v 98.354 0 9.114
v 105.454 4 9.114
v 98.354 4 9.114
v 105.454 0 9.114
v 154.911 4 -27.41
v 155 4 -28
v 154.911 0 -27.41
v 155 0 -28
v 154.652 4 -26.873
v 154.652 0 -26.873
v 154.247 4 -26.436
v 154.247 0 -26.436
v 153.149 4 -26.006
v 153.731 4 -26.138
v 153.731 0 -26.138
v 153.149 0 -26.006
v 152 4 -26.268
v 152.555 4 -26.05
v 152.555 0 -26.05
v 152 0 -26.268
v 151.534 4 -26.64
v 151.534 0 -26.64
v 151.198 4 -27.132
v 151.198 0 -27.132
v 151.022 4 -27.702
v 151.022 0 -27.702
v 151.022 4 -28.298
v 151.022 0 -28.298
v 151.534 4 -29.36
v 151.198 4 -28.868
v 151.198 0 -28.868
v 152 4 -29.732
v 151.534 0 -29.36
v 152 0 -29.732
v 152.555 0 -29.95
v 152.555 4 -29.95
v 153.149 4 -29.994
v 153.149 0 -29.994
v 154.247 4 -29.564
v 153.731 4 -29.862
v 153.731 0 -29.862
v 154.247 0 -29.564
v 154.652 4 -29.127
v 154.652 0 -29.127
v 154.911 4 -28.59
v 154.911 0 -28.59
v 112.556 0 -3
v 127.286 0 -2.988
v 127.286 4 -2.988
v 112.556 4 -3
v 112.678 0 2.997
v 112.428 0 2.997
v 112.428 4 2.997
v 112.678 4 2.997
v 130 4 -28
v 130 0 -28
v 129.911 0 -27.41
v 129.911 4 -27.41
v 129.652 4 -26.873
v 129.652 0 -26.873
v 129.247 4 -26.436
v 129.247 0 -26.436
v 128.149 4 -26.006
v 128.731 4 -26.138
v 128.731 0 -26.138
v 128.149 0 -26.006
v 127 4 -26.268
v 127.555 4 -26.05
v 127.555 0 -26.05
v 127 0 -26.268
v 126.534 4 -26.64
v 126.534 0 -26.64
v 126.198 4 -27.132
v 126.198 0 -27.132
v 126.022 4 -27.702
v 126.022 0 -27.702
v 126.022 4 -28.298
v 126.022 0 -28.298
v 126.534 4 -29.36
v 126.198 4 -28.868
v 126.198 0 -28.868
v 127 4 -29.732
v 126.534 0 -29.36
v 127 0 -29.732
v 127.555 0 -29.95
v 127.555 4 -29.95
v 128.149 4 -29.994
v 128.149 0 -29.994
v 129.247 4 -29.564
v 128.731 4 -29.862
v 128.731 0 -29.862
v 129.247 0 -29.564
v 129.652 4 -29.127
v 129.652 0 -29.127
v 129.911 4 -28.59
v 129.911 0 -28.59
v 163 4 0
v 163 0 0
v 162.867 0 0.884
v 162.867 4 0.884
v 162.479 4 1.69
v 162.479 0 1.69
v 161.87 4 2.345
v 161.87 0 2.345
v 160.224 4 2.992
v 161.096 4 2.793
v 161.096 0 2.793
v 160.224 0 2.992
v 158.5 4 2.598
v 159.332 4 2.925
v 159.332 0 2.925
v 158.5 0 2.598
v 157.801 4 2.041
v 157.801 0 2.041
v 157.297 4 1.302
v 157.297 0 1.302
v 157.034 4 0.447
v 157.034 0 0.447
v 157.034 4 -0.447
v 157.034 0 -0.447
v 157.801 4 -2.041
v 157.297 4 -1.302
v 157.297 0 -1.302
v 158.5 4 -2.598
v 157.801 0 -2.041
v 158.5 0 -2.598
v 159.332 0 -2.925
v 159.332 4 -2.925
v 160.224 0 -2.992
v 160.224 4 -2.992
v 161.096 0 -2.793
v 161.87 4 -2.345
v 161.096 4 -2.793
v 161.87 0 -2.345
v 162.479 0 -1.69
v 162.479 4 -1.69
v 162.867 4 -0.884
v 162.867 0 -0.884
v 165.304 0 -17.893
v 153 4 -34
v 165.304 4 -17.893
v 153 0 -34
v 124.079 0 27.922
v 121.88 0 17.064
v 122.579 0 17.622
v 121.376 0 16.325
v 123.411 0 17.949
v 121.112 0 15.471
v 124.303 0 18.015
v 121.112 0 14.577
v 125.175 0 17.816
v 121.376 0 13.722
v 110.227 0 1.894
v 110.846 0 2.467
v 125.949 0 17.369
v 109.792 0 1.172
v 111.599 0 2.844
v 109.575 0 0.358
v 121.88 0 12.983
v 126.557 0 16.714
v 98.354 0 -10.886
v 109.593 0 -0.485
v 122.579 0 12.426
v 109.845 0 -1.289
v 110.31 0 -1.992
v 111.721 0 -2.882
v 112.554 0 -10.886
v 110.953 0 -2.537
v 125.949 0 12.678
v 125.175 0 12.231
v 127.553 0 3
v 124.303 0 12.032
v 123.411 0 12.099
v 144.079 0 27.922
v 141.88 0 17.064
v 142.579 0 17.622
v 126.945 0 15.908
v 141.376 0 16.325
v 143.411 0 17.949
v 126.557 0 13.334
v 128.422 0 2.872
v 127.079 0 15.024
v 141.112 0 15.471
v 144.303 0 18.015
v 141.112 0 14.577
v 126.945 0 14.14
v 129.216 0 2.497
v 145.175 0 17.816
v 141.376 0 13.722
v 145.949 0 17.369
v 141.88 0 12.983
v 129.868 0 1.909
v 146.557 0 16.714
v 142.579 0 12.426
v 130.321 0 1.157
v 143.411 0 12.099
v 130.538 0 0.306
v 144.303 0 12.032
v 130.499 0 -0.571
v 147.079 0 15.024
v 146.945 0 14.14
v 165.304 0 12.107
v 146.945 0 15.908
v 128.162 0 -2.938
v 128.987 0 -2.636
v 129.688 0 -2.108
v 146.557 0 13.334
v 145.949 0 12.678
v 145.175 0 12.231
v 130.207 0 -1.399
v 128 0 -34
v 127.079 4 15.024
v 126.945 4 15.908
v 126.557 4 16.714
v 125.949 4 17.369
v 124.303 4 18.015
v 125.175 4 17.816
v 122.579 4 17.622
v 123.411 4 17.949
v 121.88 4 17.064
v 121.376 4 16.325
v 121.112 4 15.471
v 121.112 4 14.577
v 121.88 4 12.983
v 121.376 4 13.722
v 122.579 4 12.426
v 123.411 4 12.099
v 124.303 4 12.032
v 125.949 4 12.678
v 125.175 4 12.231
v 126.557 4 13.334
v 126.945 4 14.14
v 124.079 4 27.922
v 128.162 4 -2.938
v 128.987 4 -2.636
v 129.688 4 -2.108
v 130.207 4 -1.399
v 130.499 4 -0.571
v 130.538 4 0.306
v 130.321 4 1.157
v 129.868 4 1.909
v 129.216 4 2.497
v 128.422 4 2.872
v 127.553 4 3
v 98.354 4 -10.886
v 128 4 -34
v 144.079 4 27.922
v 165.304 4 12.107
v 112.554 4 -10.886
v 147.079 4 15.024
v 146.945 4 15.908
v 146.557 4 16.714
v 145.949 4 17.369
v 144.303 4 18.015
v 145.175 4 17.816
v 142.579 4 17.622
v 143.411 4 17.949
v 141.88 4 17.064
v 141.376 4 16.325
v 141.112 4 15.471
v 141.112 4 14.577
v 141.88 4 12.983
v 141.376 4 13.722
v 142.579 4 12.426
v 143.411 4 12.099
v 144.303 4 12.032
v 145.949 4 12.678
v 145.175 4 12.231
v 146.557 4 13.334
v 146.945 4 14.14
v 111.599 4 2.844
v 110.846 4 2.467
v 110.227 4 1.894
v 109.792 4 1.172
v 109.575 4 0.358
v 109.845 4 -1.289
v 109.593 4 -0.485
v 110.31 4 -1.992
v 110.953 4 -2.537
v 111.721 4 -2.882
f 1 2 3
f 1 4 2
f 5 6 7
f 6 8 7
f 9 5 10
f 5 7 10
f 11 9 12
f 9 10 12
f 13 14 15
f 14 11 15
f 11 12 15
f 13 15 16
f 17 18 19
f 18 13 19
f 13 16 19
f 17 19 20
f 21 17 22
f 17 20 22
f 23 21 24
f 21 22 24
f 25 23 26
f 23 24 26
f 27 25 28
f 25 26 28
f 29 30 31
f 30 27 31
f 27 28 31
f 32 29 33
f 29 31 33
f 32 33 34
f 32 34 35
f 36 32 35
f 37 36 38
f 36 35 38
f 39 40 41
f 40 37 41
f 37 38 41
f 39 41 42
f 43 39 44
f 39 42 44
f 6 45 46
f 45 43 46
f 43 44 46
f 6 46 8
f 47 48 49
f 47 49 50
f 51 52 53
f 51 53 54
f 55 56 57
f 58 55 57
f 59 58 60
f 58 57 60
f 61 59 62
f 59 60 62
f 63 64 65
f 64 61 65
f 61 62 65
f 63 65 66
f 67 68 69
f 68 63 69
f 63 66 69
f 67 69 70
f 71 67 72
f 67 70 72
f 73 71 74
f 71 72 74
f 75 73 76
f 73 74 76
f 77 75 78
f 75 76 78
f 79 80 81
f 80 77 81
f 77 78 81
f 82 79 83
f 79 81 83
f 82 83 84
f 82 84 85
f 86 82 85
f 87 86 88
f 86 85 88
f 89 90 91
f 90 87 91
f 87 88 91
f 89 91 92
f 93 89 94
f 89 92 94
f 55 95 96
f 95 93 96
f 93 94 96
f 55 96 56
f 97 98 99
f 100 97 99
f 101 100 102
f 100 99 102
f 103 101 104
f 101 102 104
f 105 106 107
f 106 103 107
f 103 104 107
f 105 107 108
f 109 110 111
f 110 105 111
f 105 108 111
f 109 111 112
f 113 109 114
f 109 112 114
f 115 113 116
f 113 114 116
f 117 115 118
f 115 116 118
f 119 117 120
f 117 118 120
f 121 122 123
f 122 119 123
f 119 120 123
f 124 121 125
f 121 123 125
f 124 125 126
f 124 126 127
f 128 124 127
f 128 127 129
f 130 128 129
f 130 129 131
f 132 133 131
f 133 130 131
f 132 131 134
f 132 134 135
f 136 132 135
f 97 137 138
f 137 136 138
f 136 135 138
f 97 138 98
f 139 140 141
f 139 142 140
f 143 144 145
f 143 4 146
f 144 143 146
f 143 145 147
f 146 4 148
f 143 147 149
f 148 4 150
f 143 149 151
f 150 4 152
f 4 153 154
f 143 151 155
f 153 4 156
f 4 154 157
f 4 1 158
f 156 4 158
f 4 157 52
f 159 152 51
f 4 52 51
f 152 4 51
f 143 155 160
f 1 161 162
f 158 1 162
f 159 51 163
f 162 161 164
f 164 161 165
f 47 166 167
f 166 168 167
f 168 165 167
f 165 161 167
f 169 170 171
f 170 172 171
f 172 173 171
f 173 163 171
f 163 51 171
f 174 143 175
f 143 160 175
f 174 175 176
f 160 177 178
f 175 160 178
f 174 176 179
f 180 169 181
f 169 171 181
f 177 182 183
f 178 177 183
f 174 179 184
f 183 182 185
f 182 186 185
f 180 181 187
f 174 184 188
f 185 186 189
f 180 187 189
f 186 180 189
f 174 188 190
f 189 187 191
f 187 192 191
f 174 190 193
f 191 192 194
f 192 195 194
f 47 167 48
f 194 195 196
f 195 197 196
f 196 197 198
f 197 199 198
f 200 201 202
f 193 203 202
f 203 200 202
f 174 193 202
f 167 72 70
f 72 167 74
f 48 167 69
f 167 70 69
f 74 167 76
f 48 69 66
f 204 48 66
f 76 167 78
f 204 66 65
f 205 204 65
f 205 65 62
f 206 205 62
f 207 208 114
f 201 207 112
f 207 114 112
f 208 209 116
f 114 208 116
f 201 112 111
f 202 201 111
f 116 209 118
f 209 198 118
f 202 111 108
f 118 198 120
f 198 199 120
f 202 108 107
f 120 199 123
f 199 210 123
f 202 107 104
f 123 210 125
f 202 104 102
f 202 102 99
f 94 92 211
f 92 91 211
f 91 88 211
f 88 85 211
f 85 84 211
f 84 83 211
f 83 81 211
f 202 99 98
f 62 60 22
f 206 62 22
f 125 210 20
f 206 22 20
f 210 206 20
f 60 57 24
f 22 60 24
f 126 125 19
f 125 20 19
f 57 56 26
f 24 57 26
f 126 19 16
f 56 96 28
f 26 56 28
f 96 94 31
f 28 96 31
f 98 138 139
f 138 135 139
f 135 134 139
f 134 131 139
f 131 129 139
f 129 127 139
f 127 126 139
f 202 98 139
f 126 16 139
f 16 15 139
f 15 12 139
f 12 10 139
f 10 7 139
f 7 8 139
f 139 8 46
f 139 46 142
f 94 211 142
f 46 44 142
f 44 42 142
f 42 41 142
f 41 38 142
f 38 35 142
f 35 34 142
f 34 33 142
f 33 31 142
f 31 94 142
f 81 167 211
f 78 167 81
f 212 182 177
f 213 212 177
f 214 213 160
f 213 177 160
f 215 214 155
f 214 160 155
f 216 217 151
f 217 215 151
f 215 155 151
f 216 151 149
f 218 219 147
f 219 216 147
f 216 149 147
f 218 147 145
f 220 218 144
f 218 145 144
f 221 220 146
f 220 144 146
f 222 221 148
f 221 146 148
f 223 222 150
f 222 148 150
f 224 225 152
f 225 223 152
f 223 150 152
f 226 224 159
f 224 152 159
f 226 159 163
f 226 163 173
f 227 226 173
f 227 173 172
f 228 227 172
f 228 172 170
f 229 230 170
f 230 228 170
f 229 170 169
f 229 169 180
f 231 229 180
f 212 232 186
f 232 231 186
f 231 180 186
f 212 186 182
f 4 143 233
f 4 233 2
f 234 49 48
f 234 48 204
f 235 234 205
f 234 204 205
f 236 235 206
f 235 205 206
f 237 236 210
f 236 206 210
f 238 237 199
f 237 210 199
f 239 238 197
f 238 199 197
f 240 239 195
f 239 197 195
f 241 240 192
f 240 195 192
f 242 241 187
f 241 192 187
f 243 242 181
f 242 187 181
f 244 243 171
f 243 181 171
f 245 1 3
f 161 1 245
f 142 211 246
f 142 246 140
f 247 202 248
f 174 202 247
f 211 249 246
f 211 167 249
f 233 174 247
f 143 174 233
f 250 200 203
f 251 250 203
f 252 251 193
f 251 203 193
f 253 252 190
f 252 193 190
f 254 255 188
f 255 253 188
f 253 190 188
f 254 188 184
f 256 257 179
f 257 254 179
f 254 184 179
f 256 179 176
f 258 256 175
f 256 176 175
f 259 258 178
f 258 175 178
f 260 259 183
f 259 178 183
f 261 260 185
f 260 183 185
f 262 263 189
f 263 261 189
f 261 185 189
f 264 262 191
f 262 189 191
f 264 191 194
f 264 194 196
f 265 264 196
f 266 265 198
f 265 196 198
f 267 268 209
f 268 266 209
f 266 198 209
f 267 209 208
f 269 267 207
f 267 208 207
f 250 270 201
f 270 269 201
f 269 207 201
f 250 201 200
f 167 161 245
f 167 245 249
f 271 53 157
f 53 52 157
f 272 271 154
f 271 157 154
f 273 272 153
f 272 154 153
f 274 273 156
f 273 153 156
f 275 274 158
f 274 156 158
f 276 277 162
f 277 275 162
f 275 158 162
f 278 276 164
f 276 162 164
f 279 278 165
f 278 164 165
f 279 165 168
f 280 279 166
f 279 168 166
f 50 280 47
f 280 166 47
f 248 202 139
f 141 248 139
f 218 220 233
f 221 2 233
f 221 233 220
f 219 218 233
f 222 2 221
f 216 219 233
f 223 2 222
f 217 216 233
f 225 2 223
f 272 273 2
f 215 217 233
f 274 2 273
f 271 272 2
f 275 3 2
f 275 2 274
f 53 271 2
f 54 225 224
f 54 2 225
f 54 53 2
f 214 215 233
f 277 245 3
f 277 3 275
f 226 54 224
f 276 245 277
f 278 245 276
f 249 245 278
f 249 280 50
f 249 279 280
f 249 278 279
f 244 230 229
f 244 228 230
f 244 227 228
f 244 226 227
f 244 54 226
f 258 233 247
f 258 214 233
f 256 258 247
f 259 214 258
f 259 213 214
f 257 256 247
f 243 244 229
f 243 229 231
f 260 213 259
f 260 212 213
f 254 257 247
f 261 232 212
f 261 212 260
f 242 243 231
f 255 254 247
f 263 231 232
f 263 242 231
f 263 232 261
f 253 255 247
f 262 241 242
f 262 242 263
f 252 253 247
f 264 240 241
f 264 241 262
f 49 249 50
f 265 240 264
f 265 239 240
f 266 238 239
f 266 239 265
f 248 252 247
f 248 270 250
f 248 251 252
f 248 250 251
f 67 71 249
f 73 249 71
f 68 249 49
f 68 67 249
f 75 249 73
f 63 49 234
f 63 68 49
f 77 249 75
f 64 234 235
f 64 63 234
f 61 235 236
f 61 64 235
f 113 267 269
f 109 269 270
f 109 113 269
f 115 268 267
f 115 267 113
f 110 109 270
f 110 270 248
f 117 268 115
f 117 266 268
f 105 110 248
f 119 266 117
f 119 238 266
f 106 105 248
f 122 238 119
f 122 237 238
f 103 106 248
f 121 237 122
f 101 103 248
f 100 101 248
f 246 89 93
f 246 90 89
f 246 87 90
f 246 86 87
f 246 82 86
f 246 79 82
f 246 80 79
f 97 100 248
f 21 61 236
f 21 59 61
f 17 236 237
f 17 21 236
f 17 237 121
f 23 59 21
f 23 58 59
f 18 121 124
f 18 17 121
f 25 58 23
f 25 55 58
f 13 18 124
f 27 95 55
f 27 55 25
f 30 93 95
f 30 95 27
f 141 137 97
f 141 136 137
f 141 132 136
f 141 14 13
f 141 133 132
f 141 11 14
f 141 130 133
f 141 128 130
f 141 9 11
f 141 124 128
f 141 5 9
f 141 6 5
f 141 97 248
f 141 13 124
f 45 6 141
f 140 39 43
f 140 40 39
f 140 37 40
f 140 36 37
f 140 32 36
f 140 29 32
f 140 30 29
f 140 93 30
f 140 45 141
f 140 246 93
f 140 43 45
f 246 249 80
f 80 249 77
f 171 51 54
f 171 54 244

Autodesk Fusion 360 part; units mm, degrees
sketch "Sketch1" plane through (0, 0, 0) normal (0, 1, 0) x (1, 0, 0)
  circle A0 centre (0.0008, 24.9355) radius 3
  line L0 (2.5556, 32.9383) -> (-2.4444, 32.9383)
  line L1 (2.5556, 20.6375) -> (2.5556, -15.7025)
  line L2 (8, 25) -> (8, -20)
  circle A1 centre (0, -20) radius 3
  line L3 (-2.6799, 20.7149) -> (-2.6799, -15.7789)
  arc A2 (2.5556, 20.6375) -> (-2.6799, 20.7149) centre (0.0008, 24.9355) ccw
  arc A3 (-2.6799, -15.7789) -> (2.5556, -15.7025) centre (0, -20) ccw
  dimension "d1" = 6
  dimension "d2" = 10
  dimension "d4" = 5
  dimension "d5" = 36.34
  dimension "d6" = 45
  dimension "d7" = 6
sketch "Sketch2" plane through (0, 0, 0) normal (0, 1, 0) x (1, 0, 0)
  circle A0 centre (160, 0) radius 3
  line L0 (165.3043, -12.1067) -> (165.3043, 17.8933)
  line L1 (165.3043, -12.1067) -> (144.0787, -27.9224)
  line L2 (144.0787, -27.9224) -> (124.0787, -27.9224)
  line L3 (124.0787, -27.9224) -> (105.4535, -9.1138)
  line L4 (105.4535, -9.1138) -> (98.3535, -9.1138)
  line L5 (98.3535, -9.1138) -> (98.3535, 10.8862)
  line L6 (98.3535, 10.8862) -> (112.5535, 10.8862)
  line L7 (112.5535, 10.8862) -> (128, 34)
  line L8 (128, 34) -> (153, 34)
  line L9 (153, 34) -> (165.3043, 17.8933)
  circle A1 centre (144.0787, -15.0238) radius 3
  circle A2 centre (124.0787, -15.0238) radius 3
  line L10 (112.4283, -2.9974) -> (127.553, -3)
  line L11 (127.2855, 2.988) -> (112.556, 3)
  arc A3 (127.553, -3) -> (127.2855, 2.988) centre (127.5535, 0) ccw
  arc A4 (112.556, 3) -> (112.6778, -2.9974) centre (112.5535, 0) ccw
  circle A5 centre (128, 28) radius 2
  circle A6 centre (153, 28) radius 2
  dimension "d10" = 6
  dimension "d11" = 30
  dimension "d12" = 26.47
  dimension "d13" = 20
  dimension "d14" = 26.47
  dimension "d15" = 7.1
  dimension "d16" = 20
  dimension "d17" = 14.2
  dimension "d18" = 27.8
  dimension "d19" = 25
  dimension "d21" = 6
  dimension "d22" = 6
  dimension "d23" = 6
  dimension "d24" = 15
  dimension "d25" = 6
  dimension "d26" = 4
  dimension "d27" = 4
sketch "Sketch3" plane through (0, 0, 0) normal (0, 1, 0) x (1, 0, 0)
sketch "Sketch4" plane through (0, 0, 0) normal (0, 1, 0) x (1, 0, 0)
extrude "Extrude2" add sketch "Sketch2" along normal blind 4
sketch "Sketch5" plane through (0, 0, 0) normal (0, 1, 0) x (1, 0, 0)
  circle A0 centre (0, -75) radius 3
  circle A1 centre (-0.0243, -126.973) radius 3
  line L0 (-20, -70) -> (-20, -141.97)
  line L1 (-5, -75) -> (-5, -112.8223)
  line L2 (5, -75) -> (5, -112.8395)
  arc A2 (5, -75) -> (-5, -75) centre (0, -75) ccw
  line L3 (-0.05, -141.973) -> (-0.05, -143.513)
  line L4 (-0.05, -143.513) -> (-0.4621, -143.739)
  line L5 (-0.4621, -143.739) -> (-1.4621, -143.739)
  line L6 (-1.4621, -143.739) -> (-1.9628, -143.2357)
  line L7 (-1.9628, -143.2357) -> (-1.9628, -141.8472)
  line L8 (-0.05, -145.0973) -> (-0.05, -123.9731)
  line L9 (-8.7204, -112.6318) -> (-7.8791, -112.0912)
  line L10 (-8.9448, -113.0448) -> (-8.7204, -112.6318)
  line L11 (-8.1122, -114.3403) -> (-8.9448, -113.0448)
  line L12 (-7.1857, -112.2439) -> (-6.4351, -113.412)
  line L13 (-7.8791, -112.0912) -> (-7.1857, -112.2439)
  line L14 (-12.4085, -115.6627) -> (-11.7536, -114.907)
  line L15 (-12.5075, -116.1222) -> (-12.4085, -115.6627)
  line L16 (-11.3436, -117.1306) -> (-12.5075, -116.1222)
  line L17 (-11.0453, -114.8581) -> (-9.996, -115.7674)
  line L18 (-11.7536, -114.907) -> (-11.0453, -114.8581)
  line L19 (-15.0933, -119.6099) -> (-14.6779, -118.7003)
  line L20 (-15.0589, -120.0786) -> (-15.0933, -119.6099)
  line L21 (-13.658, -120.7184) -> (-15.0589, -120.0786)
  line L22 (-14.012, -118.4539) -> (-12.749, -119.0307)
  line L23 (-14.6779, -118.7003) -> (-14.012, -118.4539)
  line L24 (-16.5573, -124.1536) -> (-16.415, -123.1638)
  line L25 (-16.3922, -124.5936) -> (-16.5573, -124.1536)
  line L26 (-14.8679, -124.8128) -> (-16.3922, -124.5936)
  line L27 (-15.8455, -122.7398) -> (-14.4712, -122.9374)
  line L28 (-16.415, -123.1638) -> (-15.8455, -122.7398)
  line L29 (-16.682, -128.9257) -> (-16.8243, -127.9359)
  line L30 (-16.3995, -129.3014) -> (-16.682, -128.9257)
  line L31 (-14.8752, -129.0822) -> (-16.3995, -129.3014)
  line L32 (-16.3973, -127.3686) -> (-15.023, -127.171)
  line L33 (-16.8243, -127.9359) -> (-16.3973, -127.3686)
  line L34 (-15.4571, -133.5396) -> (-15.8725, -132.63)
  line L35 (-15.0802, -133.8205) -> (-15.4571, -133.5396)
  line L36 (-13.6794, -133.1808) -> (-15.0802, -133.8205)
  line L37 (-15.6226, -131.9654) -> (-14.3596, -131.3886)
  line L38 (-15.8725, -132.63) -> (-15.6226, -131.9654)
  line L39 (-12.9819, -137.6215) -> (-13.6367, -136.8658)
  line L40 (-12.5412, -137.7849) -> (-12.9819, -137.6215)
  line L41 (-11.3773, -136.7764) -> (-12.5412, -137.7849)
  line L42 (-13.5843, -136.1577) -> (-12.5349, -135.2485)
  line L43 (-13.6367, -136.8658) -> (-13.5843, -136.1577)
  line L44 (-9.457, -140.8408) -> (-10.2982, -140.3002)
  line L45 (-8.9881, -140.8734) -> (-9.457, -140.8408)
  line L46 (-8.1555, -139.5779) -> (-8.9881, -140.8734)
  line L47 (-10.4473, -139.606) -> (-9.6967, -138.4379)
  line L48 (-10.2982, -140.3002) -> (-10.4473, -139.606)
  line L49 (-5.1679, -142.9365) -> (-6.1274, -142.6548)
  line L50 (-4.7088, -142.8357) -> (-5.1679, -142.9365)
  line L51 (-4.2749, -141.3581) -> (-4.7088, -142.8357)
  line L52 (-6.466, -142.0308) -> (-6.0748, -140.6985)
  line L53 (-6.1274, -142.6548) -> (-6.466, -142.0308)
  arc A3 (-5, -112.8223) -> (-6.4351, -113.412) centre (-0.0243, -126.973) ccw
  arc A4 (-8.1122, -114.3403) -> (-9.996, -115.7674) centre (-0.0243, -126.973) ccw
  arc A5 (-11.3436, -117.1306) -> (-12.749, -119.0307) centre (-0.0243, -126.973) ccw
  arc A6 (-13.658, -120.7184) -> (-14.4712, -122.9374) centre (-0.0243, -126.973) ccw
  arc A7 (-14.8679, -124.8128) -> (-15.023, -127.171) centre (-0.0243, -126.973) ccw
  arc A8 (-14.8752, -129.0822) -> (-14.3596, -131.3886) centre (-0.0243, -126.973) ccw
  arc A9 (-13.6794, -133.1808) -> (-12.5349, -135.2485) centre (-0.0243, -126.973) ccw
  arc A10 (-11.3773, -136.7764) -> (-9.6967, -138.4379) centre (-0.0243, -126.973) ccw
  arc A11 (-8.1555, -139.5779) -> (-6.0748, -140.6985) centre (-0.0243, -126.973) ccw
  arc A12 (-4.2749, -141.3581) -> (-1.9628, -141.8472) centre (-0.0243, -126.973) ccw
  arc A13 (-0.05, -141.973) -> (5, -112.8395) centre (-0.0243, -126.973) ccw
  dimension "d30" = 6
  dimension "d31" = 10
  dimension "d32" = 6
  dimension "d33" = 30
  dimension "d34" = 71.97
  dimension "d35" = 1.54
  dimension "d36" = 0.47
  dimension "d37" = 1
  dimension "d38" = 0.71
  dimension "d40" = 360
sketch "Sketch6" plane through (0, 0, 0) normal (0, 1, 0) x (1, 0, 0)
  circle A0 centre (135, -70) radius 3
  circle A1 centre (135, -95) radius 3
  line L0 (129.0014, -94.8707) -> (129, -70.0003)
  line L1 (141, -95) -> (141, -70)
  arc A2 (141, -70) -> (129, -70.0003) centre (135, -70) ccw
  line L2 (134.9353, -100.9997) -> (150.363, -126.7288)
  line L3 (138.9186, -99.5437) -> (196.6373, -196.6907)
  arc A3 (129.0014, -94.8707) -> (134.9353, -100.9997) centre (135, -95) ccw
  arc A4 (138.9186, -99.5437) -> (141, -95) centre (135, -95) ccw
  line L4 (196.6373, -196.6907) -> (189.4976, -203.5489)
  line L5 (189.4976, -203.5489) -> (182.5189, -204.0946)
  line L6 (150.363, -126.7288) -> (142.6345, -134.4043)
  line L7 (179.3777, -201.8435) -> (142.738, -137.5509)
  arc A5 (179.3777, -201.8435) -> (182.5189, -204.0946) centre (182.2851, -201.1037) ccw
  arc A6 (142.6345, -134.4043) -> (142.738, -137.5509) centre (145.2387, -135.8936) ccw
  dimension "d43" = 6
  dimension "d44" = 12
  dimension "d45" = 25
  dimension "d46" = 6
  dimension "d47" = 12
  dimension "d48" = 30
  dimension "d50" = 113
  dimension "d52" = 9.9
  dimension "d53" = 7
  dimension "d62" = 6
  dimension "d63" = 74
  dimension "d64" = 6
